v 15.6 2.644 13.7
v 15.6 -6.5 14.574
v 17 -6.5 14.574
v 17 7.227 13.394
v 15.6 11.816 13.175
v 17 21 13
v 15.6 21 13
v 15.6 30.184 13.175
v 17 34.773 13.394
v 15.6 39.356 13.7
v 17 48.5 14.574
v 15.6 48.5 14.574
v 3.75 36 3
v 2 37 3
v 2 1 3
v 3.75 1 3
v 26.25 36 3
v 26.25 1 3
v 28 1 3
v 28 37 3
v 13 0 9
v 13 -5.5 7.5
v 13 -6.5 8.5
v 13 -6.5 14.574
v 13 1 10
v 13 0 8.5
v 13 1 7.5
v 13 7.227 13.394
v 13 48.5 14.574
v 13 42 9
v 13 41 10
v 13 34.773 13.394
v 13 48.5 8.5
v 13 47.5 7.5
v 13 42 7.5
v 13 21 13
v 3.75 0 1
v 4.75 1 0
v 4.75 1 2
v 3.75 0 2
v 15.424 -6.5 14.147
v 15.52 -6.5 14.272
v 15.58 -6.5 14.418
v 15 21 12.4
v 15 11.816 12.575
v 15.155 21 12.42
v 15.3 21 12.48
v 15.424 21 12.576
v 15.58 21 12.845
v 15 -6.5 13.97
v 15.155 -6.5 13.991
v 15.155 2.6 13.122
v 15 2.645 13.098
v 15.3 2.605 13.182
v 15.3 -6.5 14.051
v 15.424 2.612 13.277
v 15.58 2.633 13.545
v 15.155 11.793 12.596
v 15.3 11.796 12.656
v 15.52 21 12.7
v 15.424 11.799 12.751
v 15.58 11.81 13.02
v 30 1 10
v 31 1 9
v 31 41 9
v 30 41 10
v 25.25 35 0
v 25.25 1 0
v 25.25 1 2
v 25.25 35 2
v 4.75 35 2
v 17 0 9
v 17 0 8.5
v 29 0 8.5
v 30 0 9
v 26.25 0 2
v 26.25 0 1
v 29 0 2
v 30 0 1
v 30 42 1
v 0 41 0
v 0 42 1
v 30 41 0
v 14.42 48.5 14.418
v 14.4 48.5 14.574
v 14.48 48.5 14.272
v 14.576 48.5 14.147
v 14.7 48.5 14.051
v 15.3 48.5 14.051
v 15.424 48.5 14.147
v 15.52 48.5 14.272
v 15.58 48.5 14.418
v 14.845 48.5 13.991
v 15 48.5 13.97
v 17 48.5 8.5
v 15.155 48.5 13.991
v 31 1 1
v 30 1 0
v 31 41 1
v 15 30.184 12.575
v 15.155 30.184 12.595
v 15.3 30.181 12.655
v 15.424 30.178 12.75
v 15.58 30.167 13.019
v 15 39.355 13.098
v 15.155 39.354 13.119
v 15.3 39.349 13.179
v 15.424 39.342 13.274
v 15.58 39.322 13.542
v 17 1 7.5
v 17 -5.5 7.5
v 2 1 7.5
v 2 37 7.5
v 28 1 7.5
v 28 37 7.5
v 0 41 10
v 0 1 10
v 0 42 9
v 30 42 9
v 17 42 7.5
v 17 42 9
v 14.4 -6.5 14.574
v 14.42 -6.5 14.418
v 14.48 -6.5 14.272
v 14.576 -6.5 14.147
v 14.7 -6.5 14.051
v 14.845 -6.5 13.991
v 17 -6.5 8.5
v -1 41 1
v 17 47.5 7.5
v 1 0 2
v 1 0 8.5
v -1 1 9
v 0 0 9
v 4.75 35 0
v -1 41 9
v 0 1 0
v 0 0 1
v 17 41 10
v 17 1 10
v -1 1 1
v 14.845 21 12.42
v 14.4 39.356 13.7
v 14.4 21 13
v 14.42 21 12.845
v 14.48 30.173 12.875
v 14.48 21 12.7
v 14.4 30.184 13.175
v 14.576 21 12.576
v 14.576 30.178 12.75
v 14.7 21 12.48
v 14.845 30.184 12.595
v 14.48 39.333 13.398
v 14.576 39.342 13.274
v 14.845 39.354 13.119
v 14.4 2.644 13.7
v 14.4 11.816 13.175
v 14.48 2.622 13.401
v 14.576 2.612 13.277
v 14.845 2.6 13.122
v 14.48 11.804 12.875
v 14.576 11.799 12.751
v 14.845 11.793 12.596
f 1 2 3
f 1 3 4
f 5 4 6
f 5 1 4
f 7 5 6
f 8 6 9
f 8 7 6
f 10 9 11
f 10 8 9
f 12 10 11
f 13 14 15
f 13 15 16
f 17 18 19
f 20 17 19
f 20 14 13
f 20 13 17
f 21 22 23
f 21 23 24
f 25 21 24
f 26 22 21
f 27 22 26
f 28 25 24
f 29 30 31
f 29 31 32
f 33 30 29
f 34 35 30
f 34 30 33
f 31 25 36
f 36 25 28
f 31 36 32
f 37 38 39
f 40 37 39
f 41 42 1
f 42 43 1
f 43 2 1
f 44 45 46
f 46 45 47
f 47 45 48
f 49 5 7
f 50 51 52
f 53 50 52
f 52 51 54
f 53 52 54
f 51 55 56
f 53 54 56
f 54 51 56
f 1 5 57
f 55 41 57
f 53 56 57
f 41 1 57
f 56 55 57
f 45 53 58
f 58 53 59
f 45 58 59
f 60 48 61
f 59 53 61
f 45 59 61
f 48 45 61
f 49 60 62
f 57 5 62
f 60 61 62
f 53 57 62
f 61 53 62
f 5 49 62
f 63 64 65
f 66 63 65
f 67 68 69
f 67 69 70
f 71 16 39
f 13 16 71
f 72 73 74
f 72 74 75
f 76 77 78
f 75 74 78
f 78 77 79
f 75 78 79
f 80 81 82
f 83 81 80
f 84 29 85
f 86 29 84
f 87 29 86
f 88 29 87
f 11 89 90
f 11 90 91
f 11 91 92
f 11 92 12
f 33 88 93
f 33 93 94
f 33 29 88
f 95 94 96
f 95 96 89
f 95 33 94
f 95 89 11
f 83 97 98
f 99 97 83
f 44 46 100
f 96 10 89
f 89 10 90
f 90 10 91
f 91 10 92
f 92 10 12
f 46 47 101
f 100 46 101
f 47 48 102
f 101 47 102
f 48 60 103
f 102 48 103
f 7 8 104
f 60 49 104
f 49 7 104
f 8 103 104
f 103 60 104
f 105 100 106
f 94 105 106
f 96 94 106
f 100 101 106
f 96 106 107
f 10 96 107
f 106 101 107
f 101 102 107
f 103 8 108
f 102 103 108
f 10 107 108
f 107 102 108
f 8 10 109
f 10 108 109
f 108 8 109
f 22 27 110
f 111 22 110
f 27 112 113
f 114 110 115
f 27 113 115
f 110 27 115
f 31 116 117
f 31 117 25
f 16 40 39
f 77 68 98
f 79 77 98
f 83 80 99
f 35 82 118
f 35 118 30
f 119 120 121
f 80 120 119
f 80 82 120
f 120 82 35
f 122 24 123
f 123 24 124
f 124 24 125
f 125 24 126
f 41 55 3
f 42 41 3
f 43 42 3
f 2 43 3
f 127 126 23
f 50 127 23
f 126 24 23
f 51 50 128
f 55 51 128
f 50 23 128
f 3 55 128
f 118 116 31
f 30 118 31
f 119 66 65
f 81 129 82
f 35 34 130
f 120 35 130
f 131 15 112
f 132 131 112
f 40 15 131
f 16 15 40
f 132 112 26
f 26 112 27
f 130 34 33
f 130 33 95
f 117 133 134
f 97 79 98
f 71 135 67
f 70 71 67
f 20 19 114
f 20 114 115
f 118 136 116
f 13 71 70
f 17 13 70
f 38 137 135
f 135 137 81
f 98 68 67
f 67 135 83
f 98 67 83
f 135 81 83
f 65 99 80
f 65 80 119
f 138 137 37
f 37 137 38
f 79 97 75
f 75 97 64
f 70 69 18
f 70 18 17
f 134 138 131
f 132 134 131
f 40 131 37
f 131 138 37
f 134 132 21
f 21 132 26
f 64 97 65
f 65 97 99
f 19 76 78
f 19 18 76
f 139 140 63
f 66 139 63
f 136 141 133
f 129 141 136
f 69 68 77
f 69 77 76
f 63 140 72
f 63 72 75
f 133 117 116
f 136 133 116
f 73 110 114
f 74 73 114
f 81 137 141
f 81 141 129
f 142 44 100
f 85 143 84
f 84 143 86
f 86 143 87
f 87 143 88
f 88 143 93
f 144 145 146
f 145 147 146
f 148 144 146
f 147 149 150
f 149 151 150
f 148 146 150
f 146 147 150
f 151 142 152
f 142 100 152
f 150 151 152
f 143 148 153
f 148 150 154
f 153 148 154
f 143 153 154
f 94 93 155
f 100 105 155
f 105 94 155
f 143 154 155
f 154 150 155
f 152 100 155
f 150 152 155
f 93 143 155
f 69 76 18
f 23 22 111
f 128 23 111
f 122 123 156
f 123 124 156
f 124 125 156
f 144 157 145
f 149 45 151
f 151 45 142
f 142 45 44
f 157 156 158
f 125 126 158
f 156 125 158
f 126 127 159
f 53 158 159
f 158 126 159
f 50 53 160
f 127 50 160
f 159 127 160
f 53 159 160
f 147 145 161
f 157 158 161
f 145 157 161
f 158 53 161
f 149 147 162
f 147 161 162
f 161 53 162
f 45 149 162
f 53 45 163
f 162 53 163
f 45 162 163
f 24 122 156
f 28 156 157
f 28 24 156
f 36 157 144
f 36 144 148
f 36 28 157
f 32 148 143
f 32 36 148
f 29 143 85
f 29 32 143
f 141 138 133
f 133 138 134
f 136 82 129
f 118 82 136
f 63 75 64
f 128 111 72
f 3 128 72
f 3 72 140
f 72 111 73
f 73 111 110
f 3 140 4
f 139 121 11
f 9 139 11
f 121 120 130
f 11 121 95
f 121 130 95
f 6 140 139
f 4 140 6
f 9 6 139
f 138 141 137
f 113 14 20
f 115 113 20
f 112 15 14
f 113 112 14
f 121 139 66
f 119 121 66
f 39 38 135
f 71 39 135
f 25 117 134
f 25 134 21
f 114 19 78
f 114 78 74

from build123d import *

# Parameters (mm, degrees)
BOX001_W        = 20.5
BOX001_H        = 35
BOX001_DEPTH    = 3
BOX002_W        = 26
BOX002_H        = 37
BOX002_DEPTH    = 4.5
BOX_W           = 32
BOX_H           = 42
BOX_DEPTH       = 10
CHAMFER001_SIZE = 1
CYLINDER_R      = 241
CYLINDER_DEPTH  = 10
TORUS_R         = 0.6
BOX003_W        = 4
BOX003_H        = 55
BOX003_DEPTH    = 20
CHAMFER_SIZE    = 1


with BuildPart() as clamp_mount_hole:
    # Box001 → Box001 (new body)
    with BuildSketch(Plane(origin=(4.75, 0, 0), x_dir=(1, 0, 0), z_dir=(0, 0, 1))):
        with Locations((10.25, 17.5)):
            Rectangle(BOX001_W, BOX001_H)
    extrude(amount=BOX001_DEPTH)


with BuildPart() as clamp_mount_shape:
    # Box002 → Box002 (new body)
    with BuildSketch(Plane(origin=(2, 0, 3), x_dir=(1, 0, 0), z_dir=(0, 0, 1))):
        with Locations((13, 18.5)):
            Rectangle(BOX002_W, BOX002_H)
    extrude(amount=BOX002_DEPTH)

    # Fusion: union clamp_mount_hole
    add(clamp_mount_hole.part)


with BuildPart() as clamp_mount_body_camfer:
    # Box → Box (new body)
    with BuildSketch(Plane(origin=(-1, 0, 0), x_dir=(1, 0, 0), z_dir=(0, 0, 1))):
        with Locations((16, 21)):
            Rectangle(BOX_W, BOX_H)
    extrude(amount=BOX_DEPTH)

    # Cut: cut clamp_mount_shape
    add(clamp_mount_shape.part, mode=Mode.SUBTRACT)

    # Chamfer001
    chamfer001_edges = [clamp_mount_body_camfer.edges().sort_by_distance(p)[0] for p in [
        (-1, 0, 5),
        (-1, 21, 10),
        (-1, 42, 5),
        (-1, 21, 0),
        (1.875, 0, 0),
        (4.75, 0, 1.5),
        (3.375, 0, 3),
        (2, 0, 5.25),
        (15, 0, 7.5),
        (28, 0, 5.25),
        (26.625, 0, 3),
        (25.25, 0, 1.5),
        (28.125, 0, 0),
        (31, 0, 5),
        (15, 0, 10),
        (15, 42, 10),
        (31, 21, 10),
        (15, 42, 0),
        (31, 42, 5),
        (31, 21, 0),
        (4.75, 17.5, 3),
        (25.25, 17.5, 3),
        (15, 35, 3),
    ]]
    chamfer(chamfer001_edges, length=CHAMFER001_SIZE)


with BuildPart() as cylinder:
    # Cylinder → Cylinder (new body)
    with BuildSketch(Plane(origin=(10, 0, 0), x_dir=(0, 0, -1), z_dir=(1, 0, 0))):
        Circle(CYLINDER_R)
    extrude(amount=CYLINDER_DEPTH)


with BuildPart() as cut_disk:
    # Torus → Torus (revolve)
    with BuildSketch(Plane(origin=(15, 0, 0), x_dir=(0, 0, -1), z_dir=(0, -1, 0))):
        with Locations((241, 0)):
            Circle(TORUS_R)
    revolve(axis=Axis((15, 0, 0), (1, 0, 0)))

    # Fusion001: union Cylinder
    add(cylinder.part)


with BuildPart() as cut_disk_1:
    # Fusion001 placement: moved
    add(cut_disk.part.moved(Location((0, 21, 254))))


with BuildPart() as fret_wire_clamp:
    # Box003 → Box003 (new body)
    with BuildSketch(Plane(origin=(13, -6.5, 7.5), x_dir=(1, 0, 0), z_dir=(0, 0, 1))):
        with Locations((2, 27.5)):
            Rectangle(BOX003_W, BOX003_H)
    extrude(amount=BOX003_DEPTH)

    # Cut001: cut cut_disk
    add(cut_disk_1.part, mode=Mode.SUBTRACT)

    # Chamfer
    chamfer_edges = [fret_wire_clamp.edges().sort_by_distance(p)[0] for p in [
        (15, -6.5, 7.5),
        (15, 48.5, 7.5),
    ]]
    chamfer(chamfer_edges, length=CHAMFER_SIZE)

    # Fusion002: union clamp_mount_body_camfer
    add(clamp_mount_body_camfer.part)


solid = fret_wire_clamp.part
